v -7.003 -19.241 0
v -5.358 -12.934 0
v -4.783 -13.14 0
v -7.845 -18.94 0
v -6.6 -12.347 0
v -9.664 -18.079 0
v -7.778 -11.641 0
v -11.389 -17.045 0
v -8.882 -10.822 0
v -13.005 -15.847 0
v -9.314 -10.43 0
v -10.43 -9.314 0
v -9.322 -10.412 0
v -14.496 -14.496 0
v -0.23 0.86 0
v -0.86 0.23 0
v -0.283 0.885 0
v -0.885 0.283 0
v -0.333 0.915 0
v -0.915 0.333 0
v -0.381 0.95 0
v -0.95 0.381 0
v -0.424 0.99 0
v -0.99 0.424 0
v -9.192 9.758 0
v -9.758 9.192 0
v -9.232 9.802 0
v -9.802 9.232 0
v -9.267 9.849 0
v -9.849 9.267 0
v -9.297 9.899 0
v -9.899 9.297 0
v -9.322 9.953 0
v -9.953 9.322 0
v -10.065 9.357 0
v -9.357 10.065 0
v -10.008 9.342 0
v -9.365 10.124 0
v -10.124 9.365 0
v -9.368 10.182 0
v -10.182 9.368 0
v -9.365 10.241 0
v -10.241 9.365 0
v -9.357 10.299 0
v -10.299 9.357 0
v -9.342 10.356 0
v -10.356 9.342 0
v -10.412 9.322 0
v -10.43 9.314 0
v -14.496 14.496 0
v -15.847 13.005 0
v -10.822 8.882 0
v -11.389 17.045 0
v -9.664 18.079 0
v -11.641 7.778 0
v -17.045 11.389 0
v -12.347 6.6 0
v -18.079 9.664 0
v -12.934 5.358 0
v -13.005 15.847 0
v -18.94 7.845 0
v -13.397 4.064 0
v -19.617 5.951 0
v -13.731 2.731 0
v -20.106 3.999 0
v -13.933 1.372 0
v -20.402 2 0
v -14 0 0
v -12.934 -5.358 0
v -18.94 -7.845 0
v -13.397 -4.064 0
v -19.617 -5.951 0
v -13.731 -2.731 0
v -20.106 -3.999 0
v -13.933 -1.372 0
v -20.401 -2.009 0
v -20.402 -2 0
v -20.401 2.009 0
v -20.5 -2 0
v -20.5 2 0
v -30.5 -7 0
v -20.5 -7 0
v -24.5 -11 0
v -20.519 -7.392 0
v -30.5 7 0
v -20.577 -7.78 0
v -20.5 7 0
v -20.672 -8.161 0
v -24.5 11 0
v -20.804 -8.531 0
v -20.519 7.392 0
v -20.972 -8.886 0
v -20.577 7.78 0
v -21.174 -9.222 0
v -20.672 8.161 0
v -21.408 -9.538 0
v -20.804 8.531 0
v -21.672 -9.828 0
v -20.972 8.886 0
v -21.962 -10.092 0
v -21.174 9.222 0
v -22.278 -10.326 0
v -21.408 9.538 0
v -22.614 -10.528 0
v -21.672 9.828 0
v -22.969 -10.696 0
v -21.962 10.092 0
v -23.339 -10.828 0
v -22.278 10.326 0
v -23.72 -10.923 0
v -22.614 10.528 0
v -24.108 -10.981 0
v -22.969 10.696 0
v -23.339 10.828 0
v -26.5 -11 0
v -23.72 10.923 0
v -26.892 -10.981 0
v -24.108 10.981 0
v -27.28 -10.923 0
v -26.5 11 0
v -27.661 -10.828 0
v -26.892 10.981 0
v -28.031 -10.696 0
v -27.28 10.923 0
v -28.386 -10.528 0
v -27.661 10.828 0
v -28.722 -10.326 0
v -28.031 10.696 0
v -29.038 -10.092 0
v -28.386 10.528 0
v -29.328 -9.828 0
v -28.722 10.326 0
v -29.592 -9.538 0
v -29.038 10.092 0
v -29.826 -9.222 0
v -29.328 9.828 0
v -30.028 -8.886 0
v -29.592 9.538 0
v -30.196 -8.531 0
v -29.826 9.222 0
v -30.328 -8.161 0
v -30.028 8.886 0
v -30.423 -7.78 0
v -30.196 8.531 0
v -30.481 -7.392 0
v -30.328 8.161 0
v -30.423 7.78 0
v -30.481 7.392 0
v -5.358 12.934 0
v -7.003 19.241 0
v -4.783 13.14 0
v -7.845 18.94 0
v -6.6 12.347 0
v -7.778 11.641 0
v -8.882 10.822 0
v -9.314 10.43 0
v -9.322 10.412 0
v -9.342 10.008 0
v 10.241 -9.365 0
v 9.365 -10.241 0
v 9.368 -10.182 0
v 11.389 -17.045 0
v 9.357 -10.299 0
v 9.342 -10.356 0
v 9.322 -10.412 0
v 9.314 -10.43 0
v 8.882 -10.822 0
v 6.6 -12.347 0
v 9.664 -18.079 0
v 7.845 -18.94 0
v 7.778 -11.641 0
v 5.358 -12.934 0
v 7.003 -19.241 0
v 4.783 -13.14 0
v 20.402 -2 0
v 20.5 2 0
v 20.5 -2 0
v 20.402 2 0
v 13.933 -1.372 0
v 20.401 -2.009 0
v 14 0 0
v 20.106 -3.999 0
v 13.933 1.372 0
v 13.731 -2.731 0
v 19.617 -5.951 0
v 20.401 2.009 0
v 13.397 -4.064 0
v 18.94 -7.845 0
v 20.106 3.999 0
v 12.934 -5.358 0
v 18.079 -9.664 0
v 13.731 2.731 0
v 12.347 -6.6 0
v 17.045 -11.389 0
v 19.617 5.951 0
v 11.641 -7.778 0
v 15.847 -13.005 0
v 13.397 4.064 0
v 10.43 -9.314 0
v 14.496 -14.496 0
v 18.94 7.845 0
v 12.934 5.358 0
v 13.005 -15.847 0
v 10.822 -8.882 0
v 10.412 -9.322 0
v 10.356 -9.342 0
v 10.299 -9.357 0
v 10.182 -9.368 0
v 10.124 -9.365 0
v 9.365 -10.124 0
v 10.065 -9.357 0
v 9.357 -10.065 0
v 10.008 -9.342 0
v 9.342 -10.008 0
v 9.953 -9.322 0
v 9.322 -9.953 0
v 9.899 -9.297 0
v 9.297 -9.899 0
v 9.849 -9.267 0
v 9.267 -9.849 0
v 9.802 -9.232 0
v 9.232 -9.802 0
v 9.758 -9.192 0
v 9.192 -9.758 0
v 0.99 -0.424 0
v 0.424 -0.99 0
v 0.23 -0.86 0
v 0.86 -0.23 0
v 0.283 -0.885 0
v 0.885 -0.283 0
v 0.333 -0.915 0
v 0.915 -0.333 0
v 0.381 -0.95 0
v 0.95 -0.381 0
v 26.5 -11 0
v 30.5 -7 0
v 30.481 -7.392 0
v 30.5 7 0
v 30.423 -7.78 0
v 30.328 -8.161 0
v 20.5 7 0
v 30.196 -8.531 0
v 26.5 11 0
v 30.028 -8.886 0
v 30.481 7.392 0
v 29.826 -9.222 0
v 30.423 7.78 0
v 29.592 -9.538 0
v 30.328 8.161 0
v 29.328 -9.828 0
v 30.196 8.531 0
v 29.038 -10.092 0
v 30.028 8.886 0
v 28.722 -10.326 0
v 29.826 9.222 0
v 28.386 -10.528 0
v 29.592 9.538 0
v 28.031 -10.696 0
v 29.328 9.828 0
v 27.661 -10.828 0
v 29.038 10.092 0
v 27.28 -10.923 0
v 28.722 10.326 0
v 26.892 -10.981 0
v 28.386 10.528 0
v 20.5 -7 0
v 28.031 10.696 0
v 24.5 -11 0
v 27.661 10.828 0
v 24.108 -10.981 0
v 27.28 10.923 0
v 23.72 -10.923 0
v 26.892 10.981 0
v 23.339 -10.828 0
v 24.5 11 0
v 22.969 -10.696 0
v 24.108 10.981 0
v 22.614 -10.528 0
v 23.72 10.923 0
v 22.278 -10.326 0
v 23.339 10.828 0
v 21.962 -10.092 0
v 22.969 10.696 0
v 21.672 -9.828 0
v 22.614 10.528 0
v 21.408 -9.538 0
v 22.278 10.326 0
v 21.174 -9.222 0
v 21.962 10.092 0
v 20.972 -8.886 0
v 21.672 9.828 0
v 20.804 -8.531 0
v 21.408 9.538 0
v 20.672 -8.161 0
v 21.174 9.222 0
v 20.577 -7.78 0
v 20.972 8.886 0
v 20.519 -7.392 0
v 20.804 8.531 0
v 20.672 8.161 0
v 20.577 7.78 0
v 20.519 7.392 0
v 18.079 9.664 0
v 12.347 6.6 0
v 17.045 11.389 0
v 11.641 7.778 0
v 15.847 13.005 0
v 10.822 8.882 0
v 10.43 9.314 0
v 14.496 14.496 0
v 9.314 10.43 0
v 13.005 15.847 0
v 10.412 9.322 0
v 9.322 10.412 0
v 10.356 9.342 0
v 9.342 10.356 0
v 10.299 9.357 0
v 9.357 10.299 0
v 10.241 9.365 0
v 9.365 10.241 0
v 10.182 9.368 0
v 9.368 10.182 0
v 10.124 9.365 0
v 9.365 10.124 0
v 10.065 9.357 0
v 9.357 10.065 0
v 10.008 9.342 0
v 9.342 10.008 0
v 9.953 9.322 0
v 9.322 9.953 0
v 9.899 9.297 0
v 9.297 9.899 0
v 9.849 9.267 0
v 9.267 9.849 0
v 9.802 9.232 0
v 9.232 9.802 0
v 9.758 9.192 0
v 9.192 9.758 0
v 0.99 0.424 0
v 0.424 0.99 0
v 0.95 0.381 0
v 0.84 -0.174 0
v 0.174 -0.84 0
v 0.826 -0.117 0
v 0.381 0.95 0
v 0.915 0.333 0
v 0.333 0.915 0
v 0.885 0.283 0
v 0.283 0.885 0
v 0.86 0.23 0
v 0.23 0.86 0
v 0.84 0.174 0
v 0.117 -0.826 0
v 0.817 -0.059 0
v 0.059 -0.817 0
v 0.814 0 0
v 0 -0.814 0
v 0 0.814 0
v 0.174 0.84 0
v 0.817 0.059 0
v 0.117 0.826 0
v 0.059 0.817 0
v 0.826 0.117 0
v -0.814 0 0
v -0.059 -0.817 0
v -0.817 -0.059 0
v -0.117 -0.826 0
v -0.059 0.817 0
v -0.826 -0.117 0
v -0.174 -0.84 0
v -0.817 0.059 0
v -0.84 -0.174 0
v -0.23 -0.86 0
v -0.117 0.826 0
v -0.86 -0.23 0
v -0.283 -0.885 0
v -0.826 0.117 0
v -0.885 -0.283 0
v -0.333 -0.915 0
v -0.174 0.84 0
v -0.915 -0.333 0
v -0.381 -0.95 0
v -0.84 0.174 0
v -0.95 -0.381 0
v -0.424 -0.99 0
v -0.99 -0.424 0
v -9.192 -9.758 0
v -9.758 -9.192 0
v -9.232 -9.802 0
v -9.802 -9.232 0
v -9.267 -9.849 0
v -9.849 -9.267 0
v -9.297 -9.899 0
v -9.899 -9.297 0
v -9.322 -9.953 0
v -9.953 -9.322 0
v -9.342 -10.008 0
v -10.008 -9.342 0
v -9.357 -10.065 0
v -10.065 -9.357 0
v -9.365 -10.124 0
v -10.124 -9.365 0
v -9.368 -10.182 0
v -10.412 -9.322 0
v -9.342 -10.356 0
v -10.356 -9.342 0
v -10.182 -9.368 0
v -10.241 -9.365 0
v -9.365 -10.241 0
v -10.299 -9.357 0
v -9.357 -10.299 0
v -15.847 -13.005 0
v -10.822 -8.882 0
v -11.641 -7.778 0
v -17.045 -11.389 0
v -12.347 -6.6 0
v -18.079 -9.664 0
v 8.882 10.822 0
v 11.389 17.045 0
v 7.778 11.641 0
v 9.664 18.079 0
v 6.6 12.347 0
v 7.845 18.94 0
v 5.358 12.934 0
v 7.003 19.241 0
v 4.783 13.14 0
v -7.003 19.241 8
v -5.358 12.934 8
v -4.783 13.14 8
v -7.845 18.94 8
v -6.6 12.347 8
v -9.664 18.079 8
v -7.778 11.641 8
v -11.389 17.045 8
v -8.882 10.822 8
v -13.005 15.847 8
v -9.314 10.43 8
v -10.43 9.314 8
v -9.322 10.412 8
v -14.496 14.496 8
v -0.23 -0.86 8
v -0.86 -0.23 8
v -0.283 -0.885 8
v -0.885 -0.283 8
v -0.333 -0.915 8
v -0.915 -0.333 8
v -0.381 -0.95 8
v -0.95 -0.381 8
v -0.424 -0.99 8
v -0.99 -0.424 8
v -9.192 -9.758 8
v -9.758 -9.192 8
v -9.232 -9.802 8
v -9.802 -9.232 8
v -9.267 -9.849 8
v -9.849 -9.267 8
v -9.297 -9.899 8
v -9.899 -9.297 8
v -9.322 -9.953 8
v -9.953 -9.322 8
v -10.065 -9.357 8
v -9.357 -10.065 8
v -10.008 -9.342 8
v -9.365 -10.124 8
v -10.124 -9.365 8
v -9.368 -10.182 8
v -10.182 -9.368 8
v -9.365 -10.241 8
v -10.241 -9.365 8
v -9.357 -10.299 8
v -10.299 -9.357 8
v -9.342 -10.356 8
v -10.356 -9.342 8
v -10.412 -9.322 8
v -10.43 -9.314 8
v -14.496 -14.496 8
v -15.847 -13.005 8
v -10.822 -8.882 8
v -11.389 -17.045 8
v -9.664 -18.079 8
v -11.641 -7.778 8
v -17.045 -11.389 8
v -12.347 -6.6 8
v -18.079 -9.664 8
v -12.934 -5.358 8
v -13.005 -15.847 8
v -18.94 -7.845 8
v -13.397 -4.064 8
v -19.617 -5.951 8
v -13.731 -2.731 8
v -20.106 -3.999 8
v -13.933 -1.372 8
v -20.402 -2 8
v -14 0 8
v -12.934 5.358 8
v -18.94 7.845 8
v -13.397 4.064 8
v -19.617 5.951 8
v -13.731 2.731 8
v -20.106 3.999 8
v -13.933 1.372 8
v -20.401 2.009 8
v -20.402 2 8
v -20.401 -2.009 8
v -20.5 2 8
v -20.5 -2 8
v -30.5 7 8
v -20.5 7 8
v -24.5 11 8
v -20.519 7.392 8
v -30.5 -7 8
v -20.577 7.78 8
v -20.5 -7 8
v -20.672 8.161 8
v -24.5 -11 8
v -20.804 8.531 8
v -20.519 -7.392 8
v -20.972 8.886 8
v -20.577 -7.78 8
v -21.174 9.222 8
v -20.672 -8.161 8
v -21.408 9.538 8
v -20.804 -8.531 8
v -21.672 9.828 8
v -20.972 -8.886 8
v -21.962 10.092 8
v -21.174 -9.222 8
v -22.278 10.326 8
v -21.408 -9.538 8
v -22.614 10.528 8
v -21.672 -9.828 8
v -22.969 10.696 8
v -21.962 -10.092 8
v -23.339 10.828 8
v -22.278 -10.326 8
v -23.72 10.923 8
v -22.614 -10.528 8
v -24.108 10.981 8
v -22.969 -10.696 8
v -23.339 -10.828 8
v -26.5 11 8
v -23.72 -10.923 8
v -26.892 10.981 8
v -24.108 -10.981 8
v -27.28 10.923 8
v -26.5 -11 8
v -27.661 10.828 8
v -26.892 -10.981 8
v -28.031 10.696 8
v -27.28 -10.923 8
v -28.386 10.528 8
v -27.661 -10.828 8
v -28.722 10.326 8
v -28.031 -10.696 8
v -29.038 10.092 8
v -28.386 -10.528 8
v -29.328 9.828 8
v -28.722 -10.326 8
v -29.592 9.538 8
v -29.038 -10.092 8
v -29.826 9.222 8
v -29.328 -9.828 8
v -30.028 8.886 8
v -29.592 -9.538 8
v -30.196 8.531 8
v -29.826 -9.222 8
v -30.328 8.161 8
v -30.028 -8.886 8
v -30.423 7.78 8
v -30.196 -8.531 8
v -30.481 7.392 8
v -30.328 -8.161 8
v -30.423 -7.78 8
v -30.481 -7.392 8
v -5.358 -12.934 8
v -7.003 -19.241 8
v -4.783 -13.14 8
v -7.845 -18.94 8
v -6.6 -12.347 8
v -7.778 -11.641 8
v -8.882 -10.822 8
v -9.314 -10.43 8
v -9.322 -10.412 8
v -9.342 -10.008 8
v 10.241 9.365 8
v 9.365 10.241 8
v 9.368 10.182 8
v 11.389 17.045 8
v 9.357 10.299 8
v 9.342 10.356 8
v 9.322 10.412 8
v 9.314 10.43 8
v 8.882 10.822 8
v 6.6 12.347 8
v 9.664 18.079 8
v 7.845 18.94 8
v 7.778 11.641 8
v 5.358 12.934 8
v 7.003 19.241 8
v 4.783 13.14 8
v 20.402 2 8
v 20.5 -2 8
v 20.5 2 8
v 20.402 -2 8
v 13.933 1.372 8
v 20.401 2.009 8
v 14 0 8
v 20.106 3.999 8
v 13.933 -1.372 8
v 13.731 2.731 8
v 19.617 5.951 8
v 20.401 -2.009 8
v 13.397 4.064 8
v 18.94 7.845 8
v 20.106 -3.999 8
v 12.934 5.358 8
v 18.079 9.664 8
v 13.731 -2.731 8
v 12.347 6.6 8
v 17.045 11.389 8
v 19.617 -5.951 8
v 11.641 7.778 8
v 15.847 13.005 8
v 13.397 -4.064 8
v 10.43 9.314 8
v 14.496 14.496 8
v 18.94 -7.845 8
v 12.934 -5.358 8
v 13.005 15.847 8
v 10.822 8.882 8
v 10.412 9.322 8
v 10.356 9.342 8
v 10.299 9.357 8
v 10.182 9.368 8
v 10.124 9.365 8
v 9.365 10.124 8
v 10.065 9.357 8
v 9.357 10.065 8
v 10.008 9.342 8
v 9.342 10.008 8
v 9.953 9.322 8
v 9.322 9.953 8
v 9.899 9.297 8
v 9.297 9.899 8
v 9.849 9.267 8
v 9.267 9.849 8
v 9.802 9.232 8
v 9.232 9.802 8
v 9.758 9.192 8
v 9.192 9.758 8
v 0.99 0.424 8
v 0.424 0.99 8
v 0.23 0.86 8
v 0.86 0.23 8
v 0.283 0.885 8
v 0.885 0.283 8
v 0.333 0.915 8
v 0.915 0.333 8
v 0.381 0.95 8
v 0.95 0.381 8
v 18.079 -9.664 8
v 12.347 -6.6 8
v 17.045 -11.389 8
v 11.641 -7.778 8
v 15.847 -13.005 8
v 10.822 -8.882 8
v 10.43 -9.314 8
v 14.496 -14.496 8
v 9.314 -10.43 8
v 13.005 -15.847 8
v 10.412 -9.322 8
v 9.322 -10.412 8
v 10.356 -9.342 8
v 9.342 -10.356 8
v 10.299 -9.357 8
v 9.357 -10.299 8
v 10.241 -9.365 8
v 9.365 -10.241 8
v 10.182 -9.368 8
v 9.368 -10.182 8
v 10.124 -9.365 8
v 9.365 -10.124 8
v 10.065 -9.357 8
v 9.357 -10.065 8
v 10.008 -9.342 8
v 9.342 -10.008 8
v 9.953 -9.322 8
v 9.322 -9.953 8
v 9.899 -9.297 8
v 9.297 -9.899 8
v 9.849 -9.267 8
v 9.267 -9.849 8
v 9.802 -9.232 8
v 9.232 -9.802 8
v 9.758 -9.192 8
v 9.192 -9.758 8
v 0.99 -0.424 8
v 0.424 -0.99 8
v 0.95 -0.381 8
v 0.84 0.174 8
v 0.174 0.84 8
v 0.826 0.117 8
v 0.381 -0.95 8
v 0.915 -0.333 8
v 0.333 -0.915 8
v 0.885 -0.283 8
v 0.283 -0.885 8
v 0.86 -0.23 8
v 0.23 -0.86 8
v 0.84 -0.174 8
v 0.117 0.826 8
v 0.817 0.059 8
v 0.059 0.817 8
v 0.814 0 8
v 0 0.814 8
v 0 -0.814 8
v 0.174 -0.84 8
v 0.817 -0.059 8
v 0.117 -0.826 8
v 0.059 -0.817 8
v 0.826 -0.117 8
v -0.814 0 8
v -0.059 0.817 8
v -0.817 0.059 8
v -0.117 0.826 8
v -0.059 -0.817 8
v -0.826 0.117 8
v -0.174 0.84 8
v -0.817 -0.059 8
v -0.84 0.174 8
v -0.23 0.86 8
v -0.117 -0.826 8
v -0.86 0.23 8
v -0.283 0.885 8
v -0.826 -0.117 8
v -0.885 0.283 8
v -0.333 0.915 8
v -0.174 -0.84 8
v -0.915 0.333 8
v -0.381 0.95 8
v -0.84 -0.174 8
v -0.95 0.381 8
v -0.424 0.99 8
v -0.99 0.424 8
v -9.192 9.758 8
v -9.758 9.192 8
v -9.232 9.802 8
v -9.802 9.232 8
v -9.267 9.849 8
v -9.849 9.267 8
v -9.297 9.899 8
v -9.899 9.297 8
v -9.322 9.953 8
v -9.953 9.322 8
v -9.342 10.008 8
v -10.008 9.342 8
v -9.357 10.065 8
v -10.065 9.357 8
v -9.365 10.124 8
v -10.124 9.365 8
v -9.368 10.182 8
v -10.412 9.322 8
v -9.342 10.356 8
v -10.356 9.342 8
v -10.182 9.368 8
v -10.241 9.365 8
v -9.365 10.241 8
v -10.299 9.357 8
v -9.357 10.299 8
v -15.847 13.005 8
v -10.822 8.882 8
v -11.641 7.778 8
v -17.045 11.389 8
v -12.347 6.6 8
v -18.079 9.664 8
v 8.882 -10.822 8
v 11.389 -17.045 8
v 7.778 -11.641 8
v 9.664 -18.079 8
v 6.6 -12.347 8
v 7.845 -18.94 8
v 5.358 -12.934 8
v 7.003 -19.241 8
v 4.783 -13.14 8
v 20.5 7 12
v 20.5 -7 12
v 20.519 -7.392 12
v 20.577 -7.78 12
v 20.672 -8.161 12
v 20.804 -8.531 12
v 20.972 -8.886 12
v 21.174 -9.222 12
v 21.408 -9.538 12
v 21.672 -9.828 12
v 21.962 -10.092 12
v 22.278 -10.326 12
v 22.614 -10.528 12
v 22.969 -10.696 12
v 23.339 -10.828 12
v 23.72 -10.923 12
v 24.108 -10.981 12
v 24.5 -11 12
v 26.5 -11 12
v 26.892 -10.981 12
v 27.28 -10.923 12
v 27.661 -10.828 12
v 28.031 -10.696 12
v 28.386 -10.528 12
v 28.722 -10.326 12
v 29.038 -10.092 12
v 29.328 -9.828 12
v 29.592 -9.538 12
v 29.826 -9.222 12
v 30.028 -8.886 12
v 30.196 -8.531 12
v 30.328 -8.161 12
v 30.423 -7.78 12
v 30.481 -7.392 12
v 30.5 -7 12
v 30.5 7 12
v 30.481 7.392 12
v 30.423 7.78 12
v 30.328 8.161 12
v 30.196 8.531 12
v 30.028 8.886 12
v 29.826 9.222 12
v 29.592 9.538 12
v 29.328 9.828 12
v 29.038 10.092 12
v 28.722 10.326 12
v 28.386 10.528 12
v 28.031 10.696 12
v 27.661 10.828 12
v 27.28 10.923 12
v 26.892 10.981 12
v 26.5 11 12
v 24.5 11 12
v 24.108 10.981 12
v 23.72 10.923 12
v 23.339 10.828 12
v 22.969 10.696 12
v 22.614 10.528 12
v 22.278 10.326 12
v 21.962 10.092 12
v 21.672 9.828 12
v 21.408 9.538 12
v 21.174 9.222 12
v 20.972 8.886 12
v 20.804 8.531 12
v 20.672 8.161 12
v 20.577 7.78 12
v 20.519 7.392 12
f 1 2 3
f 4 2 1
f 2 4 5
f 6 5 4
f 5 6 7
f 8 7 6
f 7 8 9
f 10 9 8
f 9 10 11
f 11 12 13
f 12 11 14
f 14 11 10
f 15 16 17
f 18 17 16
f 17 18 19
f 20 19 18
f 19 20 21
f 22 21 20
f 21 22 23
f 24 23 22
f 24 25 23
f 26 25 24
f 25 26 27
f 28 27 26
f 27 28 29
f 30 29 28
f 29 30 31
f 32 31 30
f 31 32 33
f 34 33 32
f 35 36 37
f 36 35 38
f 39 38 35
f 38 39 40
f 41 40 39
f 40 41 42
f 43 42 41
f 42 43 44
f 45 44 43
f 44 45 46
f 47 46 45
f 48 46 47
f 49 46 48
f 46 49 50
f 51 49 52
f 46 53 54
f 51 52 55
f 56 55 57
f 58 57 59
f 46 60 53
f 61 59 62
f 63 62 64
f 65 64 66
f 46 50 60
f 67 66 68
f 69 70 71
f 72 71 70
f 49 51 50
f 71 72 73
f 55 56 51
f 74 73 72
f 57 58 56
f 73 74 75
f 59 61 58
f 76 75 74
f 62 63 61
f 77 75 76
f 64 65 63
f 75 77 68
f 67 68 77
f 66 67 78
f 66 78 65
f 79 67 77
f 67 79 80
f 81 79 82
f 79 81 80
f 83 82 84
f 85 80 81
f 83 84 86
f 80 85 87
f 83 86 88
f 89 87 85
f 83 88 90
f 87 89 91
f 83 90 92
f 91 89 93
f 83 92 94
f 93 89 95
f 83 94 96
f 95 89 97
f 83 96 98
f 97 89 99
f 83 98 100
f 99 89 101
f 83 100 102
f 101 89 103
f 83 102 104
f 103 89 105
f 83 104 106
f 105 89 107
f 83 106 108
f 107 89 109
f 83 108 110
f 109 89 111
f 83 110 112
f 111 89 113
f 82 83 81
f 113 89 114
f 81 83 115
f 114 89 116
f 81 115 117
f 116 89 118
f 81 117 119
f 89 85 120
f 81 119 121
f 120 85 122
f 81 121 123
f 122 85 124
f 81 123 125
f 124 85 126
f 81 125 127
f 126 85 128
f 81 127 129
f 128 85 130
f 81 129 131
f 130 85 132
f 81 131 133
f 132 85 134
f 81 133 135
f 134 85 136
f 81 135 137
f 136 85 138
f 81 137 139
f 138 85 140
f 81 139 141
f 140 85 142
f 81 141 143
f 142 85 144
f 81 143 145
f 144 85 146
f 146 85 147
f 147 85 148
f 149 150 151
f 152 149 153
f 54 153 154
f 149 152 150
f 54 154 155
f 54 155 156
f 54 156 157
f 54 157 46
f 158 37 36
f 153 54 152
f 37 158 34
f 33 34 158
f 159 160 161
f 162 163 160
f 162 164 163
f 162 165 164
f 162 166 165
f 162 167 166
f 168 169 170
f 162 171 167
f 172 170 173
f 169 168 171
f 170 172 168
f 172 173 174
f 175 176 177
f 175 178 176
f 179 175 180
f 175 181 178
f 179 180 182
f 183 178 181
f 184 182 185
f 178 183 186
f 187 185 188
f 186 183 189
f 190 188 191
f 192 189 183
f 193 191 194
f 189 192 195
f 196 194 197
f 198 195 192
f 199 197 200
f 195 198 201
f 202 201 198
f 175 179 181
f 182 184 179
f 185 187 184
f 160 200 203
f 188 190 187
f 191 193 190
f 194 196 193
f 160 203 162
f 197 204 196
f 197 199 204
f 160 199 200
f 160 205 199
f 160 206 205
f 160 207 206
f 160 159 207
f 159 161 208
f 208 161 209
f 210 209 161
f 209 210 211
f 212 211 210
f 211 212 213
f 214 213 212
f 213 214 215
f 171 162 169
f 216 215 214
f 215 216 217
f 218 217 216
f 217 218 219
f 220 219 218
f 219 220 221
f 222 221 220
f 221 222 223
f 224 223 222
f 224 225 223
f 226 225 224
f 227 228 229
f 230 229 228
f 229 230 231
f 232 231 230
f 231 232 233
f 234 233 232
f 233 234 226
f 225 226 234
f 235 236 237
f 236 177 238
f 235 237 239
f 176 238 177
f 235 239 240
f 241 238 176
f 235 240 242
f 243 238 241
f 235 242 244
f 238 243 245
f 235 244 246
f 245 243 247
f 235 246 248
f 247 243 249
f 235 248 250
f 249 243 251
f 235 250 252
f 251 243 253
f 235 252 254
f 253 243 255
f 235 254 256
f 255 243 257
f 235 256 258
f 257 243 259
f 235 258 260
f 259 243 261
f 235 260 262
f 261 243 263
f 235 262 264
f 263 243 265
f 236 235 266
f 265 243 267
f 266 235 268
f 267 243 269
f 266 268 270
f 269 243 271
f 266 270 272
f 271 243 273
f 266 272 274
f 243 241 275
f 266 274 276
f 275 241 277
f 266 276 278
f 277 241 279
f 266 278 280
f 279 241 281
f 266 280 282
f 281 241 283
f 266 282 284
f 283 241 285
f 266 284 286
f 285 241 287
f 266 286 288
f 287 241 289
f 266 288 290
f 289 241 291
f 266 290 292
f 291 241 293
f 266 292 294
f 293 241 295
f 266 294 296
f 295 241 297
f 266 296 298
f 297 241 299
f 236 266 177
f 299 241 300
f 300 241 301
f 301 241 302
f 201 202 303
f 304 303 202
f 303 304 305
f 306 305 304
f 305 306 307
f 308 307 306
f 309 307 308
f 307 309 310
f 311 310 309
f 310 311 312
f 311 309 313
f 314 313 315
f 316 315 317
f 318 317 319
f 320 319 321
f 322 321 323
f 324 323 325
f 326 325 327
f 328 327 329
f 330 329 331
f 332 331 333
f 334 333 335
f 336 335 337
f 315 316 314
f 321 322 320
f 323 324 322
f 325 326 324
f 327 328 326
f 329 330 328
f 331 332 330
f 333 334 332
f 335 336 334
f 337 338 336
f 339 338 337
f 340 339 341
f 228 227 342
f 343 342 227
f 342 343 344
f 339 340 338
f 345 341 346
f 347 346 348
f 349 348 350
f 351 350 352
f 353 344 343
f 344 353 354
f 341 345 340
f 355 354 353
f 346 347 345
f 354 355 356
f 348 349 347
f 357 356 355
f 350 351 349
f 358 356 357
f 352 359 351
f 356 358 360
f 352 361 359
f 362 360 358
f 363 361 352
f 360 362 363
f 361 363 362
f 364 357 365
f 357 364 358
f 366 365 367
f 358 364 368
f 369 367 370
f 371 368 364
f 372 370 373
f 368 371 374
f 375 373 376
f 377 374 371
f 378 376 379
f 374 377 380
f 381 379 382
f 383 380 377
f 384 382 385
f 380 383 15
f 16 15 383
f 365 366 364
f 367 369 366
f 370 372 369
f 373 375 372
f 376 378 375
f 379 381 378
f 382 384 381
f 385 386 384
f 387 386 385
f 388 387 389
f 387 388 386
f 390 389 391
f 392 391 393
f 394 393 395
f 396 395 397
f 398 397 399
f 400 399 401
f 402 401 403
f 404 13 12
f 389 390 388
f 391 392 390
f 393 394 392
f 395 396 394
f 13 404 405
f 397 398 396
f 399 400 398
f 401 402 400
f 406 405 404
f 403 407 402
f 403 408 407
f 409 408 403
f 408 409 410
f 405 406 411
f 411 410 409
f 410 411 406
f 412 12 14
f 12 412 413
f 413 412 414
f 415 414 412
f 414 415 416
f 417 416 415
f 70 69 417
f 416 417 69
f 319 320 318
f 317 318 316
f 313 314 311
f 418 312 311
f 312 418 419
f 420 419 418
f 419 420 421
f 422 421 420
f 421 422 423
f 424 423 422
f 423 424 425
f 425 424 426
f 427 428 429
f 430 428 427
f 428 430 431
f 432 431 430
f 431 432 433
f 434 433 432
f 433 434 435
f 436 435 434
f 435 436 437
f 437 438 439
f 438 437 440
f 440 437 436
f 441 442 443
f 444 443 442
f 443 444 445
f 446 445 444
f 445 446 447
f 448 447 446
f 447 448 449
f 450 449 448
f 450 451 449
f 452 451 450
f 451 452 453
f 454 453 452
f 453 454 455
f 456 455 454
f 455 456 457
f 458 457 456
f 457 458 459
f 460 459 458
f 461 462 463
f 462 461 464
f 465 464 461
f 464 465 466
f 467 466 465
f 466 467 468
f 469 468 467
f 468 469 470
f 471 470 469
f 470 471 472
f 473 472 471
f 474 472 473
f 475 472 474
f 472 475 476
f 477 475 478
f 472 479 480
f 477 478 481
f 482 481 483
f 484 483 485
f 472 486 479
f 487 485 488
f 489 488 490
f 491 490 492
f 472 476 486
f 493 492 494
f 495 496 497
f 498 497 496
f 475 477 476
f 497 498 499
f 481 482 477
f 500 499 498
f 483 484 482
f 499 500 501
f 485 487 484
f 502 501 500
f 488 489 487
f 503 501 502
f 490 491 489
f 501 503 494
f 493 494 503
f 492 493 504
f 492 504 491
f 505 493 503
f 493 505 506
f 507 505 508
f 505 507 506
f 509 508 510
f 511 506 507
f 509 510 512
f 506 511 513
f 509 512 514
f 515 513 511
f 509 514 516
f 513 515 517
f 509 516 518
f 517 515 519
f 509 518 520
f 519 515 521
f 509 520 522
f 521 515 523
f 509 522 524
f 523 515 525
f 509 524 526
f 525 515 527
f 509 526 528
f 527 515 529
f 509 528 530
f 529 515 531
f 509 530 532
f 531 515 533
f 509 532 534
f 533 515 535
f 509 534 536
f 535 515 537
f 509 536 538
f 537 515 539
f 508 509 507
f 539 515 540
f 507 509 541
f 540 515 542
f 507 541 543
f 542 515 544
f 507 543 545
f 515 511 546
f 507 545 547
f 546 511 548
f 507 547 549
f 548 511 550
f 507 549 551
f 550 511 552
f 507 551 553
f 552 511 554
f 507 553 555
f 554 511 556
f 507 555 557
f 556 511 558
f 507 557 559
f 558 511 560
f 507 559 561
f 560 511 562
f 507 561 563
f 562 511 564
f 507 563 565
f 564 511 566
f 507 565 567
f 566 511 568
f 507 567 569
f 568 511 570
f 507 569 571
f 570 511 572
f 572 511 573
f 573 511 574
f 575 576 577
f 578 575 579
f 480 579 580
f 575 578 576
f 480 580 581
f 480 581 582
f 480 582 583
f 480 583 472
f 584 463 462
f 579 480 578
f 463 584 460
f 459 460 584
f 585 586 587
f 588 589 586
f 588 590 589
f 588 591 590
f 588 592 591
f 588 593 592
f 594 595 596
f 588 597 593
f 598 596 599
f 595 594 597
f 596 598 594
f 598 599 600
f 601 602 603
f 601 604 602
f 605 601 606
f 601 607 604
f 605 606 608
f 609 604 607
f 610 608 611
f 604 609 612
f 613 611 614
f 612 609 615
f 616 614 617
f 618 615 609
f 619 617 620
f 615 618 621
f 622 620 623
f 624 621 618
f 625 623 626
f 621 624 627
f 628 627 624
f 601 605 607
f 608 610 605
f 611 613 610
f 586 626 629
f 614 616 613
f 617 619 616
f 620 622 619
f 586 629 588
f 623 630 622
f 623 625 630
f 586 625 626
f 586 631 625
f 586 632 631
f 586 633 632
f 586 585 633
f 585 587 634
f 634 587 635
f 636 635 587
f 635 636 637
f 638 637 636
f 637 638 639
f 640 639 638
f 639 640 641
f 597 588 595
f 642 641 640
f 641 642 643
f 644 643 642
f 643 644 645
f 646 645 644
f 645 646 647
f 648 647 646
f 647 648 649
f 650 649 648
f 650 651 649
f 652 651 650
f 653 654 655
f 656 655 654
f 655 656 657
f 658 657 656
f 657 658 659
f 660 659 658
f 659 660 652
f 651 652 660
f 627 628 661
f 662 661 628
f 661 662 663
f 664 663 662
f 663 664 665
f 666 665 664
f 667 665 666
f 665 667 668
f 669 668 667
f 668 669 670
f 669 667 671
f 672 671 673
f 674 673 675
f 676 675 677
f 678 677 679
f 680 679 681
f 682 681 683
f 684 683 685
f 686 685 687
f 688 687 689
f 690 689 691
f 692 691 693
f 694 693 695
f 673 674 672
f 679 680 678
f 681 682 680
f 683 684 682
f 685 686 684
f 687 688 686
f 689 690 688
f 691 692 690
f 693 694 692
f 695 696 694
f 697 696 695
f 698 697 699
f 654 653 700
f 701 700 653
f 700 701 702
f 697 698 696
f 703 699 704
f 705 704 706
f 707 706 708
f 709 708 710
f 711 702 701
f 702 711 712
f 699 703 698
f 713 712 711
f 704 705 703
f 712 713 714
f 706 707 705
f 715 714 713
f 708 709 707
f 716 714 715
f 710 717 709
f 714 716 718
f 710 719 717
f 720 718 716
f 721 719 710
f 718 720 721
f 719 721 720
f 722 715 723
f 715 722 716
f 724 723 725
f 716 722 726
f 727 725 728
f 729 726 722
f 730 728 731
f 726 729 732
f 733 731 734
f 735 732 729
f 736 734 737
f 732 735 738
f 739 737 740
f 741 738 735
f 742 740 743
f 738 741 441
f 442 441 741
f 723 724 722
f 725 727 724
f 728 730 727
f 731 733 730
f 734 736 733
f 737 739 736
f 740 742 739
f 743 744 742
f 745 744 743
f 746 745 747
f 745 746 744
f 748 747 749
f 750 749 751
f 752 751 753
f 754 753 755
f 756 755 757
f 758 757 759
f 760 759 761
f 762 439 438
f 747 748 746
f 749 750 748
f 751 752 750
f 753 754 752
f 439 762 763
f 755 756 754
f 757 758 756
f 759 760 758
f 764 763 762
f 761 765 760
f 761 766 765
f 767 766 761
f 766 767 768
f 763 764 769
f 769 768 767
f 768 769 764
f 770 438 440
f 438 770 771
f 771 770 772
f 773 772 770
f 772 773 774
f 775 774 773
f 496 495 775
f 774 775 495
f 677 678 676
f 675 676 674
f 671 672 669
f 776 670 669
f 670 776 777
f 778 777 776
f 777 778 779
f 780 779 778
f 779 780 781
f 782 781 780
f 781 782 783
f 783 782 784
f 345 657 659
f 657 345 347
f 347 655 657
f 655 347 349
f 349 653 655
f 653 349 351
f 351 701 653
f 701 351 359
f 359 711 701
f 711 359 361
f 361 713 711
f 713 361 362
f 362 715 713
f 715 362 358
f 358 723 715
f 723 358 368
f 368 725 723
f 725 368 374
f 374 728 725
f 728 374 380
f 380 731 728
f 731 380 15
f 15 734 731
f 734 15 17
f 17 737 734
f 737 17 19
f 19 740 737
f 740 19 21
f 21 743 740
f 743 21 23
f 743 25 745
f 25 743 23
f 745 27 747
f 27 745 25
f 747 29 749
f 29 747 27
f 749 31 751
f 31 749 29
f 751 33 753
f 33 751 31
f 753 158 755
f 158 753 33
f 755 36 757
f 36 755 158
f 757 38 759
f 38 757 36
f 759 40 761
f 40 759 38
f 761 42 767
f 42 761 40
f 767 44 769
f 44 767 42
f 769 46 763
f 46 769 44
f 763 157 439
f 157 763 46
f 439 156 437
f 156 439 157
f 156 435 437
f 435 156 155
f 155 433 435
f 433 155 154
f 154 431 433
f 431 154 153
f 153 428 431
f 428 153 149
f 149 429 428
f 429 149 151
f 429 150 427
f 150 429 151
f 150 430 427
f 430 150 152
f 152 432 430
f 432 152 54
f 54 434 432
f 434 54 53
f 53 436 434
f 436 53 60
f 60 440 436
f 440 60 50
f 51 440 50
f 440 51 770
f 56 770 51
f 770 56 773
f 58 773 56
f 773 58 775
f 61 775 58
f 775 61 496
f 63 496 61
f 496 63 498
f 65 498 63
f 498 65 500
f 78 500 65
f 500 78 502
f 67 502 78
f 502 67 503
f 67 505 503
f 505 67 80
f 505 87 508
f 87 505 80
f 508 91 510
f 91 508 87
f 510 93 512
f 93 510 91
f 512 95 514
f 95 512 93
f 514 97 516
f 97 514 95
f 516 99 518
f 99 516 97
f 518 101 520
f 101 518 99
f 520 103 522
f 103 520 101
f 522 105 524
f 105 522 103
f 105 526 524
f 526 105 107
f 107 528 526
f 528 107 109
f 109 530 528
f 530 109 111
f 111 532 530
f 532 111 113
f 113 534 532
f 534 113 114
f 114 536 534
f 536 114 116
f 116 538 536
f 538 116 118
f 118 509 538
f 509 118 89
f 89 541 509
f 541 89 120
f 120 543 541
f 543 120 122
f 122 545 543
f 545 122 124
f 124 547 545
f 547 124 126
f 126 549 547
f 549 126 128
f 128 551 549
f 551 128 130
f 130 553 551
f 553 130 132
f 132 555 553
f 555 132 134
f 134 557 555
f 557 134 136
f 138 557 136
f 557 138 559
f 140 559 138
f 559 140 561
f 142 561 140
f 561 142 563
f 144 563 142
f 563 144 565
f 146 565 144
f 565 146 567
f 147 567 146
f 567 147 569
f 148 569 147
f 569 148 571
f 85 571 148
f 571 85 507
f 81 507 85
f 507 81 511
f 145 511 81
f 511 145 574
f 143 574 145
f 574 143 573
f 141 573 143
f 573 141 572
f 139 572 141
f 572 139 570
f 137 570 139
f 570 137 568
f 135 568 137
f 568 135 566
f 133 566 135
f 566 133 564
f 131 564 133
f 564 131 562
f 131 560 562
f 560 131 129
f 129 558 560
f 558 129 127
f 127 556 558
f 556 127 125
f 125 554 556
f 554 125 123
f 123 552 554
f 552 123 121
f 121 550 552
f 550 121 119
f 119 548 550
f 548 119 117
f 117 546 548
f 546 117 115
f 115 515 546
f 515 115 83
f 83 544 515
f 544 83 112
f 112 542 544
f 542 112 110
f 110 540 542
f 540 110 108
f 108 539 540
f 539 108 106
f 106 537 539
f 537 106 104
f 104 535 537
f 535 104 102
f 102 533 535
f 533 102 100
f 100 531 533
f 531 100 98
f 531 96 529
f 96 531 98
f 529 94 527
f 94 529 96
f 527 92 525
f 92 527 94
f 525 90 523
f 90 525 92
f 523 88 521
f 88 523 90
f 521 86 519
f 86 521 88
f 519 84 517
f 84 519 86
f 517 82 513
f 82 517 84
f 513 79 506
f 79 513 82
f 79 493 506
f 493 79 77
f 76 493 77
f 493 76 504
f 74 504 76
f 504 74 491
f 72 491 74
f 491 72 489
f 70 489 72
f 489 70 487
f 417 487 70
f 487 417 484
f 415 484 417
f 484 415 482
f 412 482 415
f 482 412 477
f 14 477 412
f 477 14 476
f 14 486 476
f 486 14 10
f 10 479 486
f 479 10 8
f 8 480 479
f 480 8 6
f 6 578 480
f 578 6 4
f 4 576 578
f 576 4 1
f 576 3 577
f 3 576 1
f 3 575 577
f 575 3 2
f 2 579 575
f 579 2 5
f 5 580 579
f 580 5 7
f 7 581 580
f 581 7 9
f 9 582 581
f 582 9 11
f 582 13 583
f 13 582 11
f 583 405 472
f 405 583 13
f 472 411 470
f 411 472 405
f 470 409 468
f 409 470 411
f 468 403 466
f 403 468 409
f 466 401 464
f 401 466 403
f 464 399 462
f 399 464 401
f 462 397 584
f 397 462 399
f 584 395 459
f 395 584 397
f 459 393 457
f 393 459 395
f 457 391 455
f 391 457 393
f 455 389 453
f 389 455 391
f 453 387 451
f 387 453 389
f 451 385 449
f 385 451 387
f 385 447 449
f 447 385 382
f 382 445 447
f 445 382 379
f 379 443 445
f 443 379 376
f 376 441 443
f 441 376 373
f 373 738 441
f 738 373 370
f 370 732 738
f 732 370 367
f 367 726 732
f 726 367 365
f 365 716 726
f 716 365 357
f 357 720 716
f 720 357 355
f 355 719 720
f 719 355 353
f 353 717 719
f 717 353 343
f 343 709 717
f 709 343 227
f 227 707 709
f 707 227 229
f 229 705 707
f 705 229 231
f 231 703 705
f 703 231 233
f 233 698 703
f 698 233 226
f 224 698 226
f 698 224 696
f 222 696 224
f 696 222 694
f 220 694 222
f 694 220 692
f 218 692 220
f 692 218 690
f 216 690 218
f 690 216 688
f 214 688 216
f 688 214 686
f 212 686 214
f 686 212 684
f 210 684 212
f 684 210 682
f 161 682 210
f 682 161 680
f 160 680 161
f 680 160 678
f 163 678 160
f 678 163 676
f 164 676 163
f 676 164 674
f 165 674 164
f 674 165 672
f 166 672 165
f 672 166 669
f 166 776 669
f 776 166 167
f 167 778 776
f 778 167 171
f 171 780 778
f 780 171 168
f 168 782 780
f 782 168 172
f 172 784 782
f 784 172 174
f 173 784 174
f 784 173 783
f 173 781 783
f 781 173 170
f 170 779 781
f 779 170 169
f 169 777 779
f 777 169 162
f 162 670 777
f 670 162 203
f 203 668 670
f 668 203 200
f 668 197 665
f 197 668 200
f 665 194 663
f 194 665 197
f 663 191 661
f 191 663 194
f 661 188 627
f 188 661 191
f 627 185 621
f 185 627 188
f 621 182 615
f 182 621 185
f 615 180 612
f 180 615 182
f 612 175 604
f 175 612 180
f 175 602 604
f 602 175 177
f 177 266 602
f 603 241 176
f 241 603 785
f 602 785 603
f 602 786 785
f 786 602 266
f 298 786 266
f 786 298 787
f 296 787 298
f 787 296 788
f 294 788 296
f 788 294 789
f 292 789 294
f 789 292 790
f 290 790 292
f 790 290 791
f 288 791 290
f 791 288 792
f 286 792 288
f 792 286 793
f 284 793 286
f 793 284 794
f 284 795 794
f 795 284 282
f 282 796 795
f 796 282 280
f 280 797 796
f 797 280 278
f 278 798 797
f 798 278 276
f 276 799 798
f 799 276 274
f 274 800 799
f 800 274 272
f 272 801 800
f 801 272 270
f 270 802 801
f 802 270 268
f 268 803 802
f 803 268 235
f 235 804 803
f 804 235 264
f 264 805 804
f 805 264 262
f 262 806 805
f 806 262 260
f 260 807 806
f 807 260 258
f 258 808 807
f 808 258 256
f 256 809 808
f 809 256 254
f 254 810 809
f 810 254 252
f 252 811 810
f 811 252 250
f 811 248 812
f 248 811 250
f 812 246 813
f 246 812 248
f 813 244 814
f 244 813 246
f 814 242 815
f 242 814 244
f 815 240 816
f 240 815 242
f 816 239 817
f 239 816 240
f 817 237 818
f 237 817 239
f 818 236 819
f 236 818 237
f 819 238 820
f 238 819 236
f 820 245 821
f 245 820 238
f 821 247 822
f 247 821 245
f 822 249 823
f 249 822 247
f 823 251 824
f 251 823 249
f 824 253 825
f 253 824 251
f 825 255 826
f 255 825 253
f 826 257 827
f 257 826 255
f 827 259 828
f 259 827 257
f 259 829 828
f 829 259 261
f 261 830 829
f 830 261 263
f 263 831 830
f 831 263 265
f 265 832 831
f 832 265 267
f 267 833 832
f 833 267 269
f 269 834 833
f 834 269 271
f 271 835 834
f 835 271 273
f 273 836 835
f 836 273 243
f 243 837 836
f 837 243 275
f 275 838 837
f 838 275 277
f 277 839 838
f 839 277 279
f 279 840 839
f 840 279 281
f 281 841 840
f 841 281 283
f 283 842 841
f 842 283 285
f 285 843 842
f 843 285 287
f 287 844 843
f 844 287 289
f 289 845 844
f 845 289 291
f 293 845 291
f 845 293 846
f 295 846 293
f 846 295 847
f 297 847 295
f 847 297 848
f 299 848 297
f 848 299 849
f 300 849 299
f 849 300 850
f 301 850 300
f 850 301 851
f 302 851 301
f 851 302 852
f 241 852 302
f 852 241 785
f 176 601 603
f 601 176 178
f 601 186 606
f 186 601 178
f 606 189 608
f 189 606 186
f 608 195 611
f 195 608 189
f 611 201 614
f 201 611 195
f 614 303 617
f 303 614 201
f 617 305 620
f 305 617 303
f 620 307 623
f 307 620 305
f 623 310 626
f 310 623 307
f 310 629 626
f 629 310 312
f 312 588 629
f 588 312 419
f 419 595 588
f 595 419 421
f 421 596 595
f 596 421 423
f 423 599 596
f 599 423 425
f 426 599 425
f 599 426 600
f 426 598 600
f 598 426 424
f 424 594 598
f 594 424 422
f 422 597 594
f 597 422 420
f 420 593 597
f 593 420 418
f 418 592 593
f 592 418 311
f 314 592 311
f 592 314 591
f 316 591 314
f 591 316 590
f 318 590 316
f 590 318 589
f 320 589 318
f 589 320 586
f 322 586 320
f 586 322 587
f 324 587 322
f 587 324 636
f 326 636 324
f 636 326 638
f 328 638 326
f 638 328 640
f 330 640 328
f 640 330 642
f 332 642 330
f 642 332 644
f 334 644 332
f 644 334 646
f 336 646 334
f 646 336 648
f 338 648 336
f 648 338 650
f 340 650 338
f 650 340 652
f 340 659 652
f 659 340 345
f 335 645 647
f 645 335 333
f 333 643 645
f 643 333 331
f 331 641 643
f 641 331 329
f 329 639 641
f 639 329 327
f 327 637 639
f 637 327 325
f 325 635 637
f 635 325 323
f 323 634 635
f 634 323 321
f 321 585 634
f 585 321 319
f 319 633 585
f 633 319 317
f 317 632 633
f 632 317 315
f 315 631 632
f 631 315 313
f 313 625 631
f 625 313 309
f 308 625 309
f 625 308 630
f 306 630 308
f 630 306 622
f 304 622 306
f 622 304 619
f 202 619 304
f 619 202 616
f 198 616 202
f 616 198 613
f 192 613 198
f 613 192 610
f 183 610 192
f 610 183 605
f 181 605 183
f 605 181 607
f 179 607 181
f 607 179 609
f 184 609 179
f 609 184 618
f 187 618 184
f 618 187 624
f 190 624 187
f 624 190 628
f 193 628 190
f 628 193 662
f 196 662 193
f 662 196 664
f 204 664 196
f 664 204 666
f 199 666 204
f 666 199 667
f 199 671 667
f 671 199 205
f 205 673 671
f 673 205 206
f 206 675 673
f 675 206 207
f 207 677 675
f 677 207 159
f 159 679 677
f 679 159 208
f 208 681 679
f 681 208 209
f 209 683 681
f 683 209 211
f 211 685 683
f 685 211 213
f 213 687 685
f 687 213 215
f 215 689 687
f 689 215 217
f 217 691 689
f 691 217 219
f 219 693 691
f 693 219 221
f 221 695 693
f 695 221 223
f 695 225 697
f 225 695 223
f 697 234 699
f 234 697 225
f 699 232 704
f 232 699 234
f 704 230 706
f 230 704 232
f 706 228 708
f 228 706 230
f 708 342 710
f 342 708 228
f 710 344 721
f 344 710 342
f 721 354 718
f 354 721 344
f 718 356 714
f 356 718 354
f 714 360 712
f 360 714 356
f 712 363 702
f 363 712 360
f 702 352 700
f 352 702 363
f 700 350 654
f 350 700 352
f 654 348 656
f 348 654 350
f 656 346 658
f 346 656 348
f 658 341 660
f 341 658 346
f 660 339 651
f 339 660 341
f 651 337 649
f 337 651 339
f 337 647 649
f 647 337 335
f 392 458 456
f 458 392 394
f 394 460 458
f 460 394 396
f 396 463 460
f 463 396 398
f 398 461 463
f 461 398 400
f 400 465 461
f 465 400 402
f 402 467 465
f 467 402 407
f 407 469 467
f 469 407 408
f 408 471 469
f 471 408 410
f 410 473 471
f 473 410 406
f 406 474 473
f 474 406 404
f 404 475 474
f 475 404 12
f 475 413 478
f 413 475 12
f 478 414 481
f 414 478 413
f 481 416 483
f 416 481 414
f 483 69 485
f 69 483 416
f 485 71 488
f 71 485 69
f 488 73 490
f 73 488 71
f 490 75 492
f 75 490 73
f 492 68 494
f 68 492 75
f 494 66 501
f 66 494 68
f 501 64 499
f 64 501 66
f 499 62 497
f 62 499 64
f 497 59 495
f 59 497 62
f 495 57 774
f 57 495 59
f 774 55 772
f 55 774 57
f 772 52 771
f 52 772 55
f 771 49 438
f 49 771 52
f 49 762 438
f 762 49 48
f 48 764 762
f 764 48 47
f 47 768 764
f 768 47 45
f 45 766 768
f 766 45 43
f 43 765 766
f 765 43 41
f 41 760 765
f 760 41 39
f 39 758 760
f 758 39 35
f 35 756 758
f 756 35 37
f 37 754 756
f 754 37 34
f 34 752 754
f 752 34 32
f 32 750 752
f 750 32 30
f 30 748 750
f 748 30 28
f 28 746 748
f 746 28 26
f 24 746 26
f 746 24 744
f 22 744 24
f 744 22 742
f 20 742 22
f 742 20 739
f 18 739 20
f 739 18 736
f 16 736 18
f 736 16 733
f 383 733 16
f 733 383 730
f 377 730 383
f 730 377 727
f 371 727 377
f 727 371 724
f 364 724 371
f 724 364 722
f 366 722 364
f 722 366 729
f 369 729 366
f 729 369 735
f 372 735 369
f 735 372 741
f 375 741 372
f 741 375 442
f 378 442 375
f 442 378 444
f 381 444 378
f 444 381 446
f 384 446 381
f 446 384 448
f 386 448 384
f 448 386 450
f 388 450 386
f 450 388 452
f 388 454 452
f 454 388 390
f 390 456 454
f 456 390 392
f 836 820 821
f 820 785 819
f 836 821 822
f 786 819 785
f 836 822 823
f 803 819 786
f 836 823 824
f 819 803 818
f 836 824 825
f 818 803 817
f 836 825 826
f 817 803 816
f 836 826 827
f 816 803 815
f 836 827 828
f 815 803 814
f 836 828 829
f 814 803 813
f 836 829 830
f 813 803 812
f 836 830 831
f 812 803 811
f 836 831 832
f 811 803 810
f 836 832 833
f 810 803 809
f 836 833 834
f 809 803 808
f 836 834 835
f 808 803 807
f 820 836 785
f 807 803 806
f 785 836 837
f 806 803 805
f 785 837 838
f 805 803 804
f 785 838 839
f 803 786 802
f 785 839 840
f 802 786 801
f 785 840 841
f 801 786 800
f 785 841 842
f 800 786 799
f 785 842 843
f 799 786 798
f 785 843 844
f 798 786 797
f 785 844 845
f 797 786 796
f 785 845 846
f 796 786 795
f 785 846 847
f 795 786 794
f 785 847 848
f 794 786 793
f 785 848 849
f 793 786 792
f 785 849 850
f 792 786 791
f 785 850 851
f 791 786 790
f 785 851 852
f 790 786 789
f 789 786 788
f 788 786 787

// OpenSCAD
// cross-axis-flexure-pivot — a desk-scale compliant hinge: two slender beams
// cross at mid-span and weld at the crossing, so the stage rotates about a
// NEAR-FIXED VIRTUAL CENTER — the pinless hinge that, unlike a single
// small-length flexural pivot, does not wander under light load. Tier-2
// technique reference for docs/advanced-techniques.md Domain 1 (flexure
// joint families): the catalog had the SLFP (snap-cantilever-clip), the LET
// panel and the bistable arch, but not the cross-axis row — "good in
// tension, WEAK IN COMPRESSION, near-fixed virtual center".
//
// Dimensioned from the WELDED geometry, not the unwelded leaf ideal:
//
//   I = w*t^3 / 12              second moment of area (mm^4)
//   K = 8*E*I / L               pivot stiffness (N*mm/rad): the weld pins the
//                               crossing (no lateral drift), so each strip is
//                               two half-beams of length L/2 in an S-bend,
//                               four half-beams in parallel → 8·EI/L
//   sigma_weld = 2*E*t*θ/L      peak bending stress at the weld under that
//                               pinned S-bend (M_weld = 4·EI·θ/L); the pure-
//                               moment leaf σ = E·t·θ/(2L) is ~4× lower and
//                               describes beams that cross WITHOUT touching
//
// and CC1 (orientation), the reason this prints flat: the whole silhouette
// lives in the XY (bed) plane and is extruded up in Z to `w`, so every beam
// bends IN the layer plane — bending stress runs across the roads inside a
// layer, never across the bond between layers. Upright beams are out of
// scope (brief: "orientation is the product").
//
// Mechanism: a rigid frame arc and a rigid stage arc share one center (the
// virtual center at the origin, left open — neither body covers it). Two
// beams at ±alpha span the `L` between the arcs' inner faces, weld to each
// where they cross, and root into the arcs. The arcs' end faces are the hard
// stops: the stage arc's face meets the frame arc's face exactly at
// ±stop_angle, face to face over the full ring wall, so the brief's
// "overload in compression" demo bends the beams, not the stops. Requirements,
// derivations and the tune order: NOTES.md. All dimensions in millimeters.

/* [Flexure - the crossed beams] */
// Beam thickness t (mm) — the highest-leverage knob: stiffness ~ t^3, root
// stress ~ t. Production floor 0.8 (2 extrusion widths); the coupon strip
// deliberately sweeps below it to show why.
t = 0.8;
// Beam free span L (mm) — root-to-root along each strip, between the arcs'
// inner faces. Longer = lower stress for the same angle (strain ~ 1/L).
L = 28;
// Beam width = part height (mm). Multi-perimeter so one bad road does not
// kill the beam; root stress does not depend on it.
w = 8;
// Root fillet (mm) — doc fatigue rule r >= 0.5*t. Applied at the eight ring
// roots AND the four re-entrant weld corners (the highest-moment real estate).
root_fillet = 0.6;
// Crossing half-angle (deg) — each strip is inclined ±alpha to the frame↔
// stage axis and the two weld where they cross. 45 is the classic symmetric
// cross; it puts all four roots at the same radius.
alpha = 45;
// Assumed Young's modulus (MPa) — design datum for the echoes below, a
// literature-ish PETG default, NOT a measured filament. The coupon is the
// truth (NOTES.md, "Print this first").
E = 2000;

/* [Frame, stage & hard stops] */
// Hard-stop angle (deg) — the stage arc's end face meets the frame arc's end
// face exactly here, both sides. The brief's ROM target; raise toward 60 only
// if a PETG coupon survives (root stress scales linearly).
stop_angle = 40;
// Ring wall (mm) — radial thickness of the frame/stage arcs. Rigid by
// design: all compliance belongs in the beams.
arc_wall = 6.5;
// Finger tab length × width (mm) and corner radius — the handle you twist,
// and its mirror on the frame (the part you hold).
tab_len = 10;
tab_w = 22;
tab_r = 4;
// Raised finger-pad height (mm) on the stage tab — marks the side that
// moves and lifts the fingertip clear of the bed. 0 disables.
h_pad = 4;

/* [Quality] */
// Production tessellation for the arcs and fillet arcs. Previews and the
// gated STL both use this value (no per-export override).
$fn = 64;

// ---- derived -----------------------------------------------------------
r_in     = L / 2;                    // arcs' inner faces = the free-span ends
r_out    = r_in + arc_wall;          // arcs' outer radius
arc_half = (180 - stop_angle) / 2;   // each arc's half-width: face-to-face
                                     // contact lands exactly at stop_angle
land     = arc_wall - 0.5;           // beam root buried inside the ring band
tab_cx   = r_out + tab_len / 2;      // finger-tab center radius (25.5 stock)
theta    = stop_angle * PI / 180;    // ROM in rad
I        = w * t * t * t / 12;       // second moment of area (mm^4)
// Welded (pinned-crossing) model — see header. The leaf formulas below are
// kept as the unwelded reference so a reader can see the ~4× gap.
K          = 8 * E * I / L;            // pivot stiffness (N*mm/rad)
sigma_weld = 2 * E * t * theta / L;    // peak at weld, pinned S-bend
sigma_leaf = E * t * theta / (2 * L);  // pure-moment leaf (unwelded ideal)
F_handle   = K * theta / tab_cx;       // fingertip force at the tab (N)

// fitcheck pocket probes: the four open pockets flanking the crossing, on
// the ±x/±y bisectors. A probe is valid while it stays clear of both beams.
probe_d  = 0.6 * r_in;
probe_r  = 1.5;
probe_pts = [[probe_d, 0], [0, probe_d], [-probe_d, 0], [0, -probe_d]];

echo(str("cross-pivot: K ~= ", K, " N*mm/rad at +/-", stop_angle,
         " deg  (welded / pinned-crossing: 8*E*I/L, I = ", I, " mm^4, E = ",
         E, " MPa assumed)"));
echo(str("weld stress at +/-", stop_angle, " deg: ", sigma_weld,
         " MPa (pinned S-bend) — leaf ideal would be ", sigma_leaf,
         " MPa; cycle the pivot itself for the weld, not only the coupon"));
echo(str("fingertip force at r = ", tab_cx, " mm: ", F_handle,
         " N — firm at desk scale under the welded model"));
if (t < 0.8)
    echo(str("WARNING: t = ", t, " is under the 0.8 mm production floor ",
             "(2 extrusion widths) — fine for a deliberate coupon row, ",
             "not for the pivot"));

module checks() {
    assert(t >= 0.5, "t under 0.5 mm will not extrude at all");
    assert(root_fillet >= 0.5 * t,
           "root fillet below 0.5*t — ring roots and weld corners are crack starters");
    assert(w >= 2.4, "beam width under 3 perimeters (2.4 mm) — one bad road kills the beam");
    assert(alpha > 10 && alpha < 80, "crossing half-angle outside 10-80 deg");
    assert(stop_angle > 5 && stop_angle < 80, "hard-stop angle outside 5-80 deg");
    assert(arc_wall >= 1.6, "ring wall under 1.6 mm — the arcs must be rigid, not a second flexure");
    // the arcs must cover both beam roots with land to spare
    assert(arc_half >= alpha + 6,
           "arc half-width does not cover the beam roots — lower stop_angle or alpha");
    // the buried beam end must stay inside the ring's outer face
    assert(pow(r_in + land, 2) + pow(t / 2, 2) < pow(r_out - 0.2, 2),
           "beam end pokes through the ring's outer face");
    // fitcheck probes must sit in open pocket, clear of both beams AND of
    // the weld-corner fillets that grow outward along the same bisectors
    assert(probe_d * sin(alpha) - t / 2 >= probe_r + 0.5,
           "pocket probes no longer clear the beams — move them or shrink probe_r");
    assert(probe_d - (t / 2) / sin(alpha) - max(root_fillet, 0.5 * t) >= probe_r + 0.5,
           "±x pocket probes collide with weld fillets — move them or shrink fillet/probe");
    assert(probe_d - (t / 2) / cos(alpha) - max(root_fillet, 0.5 * t) >= probe_r + 0.5,
           "±y pocket probes collide with weld fillets — move them or shrink fillet/probe");
    // coupon guards
    assert(min(coupon_ts) >= 0.5, "coupon rows under 0.5 mm will not extrude");
    assert(max(coupon_ts) <= 1.6, "coupon rows over 1.6 mm stop being a flexure ladder");
}

// ---- 2D primitives (the whole part is one bed-plane silhouette) --------
module rounded2d(len, wid, r)   // convex-corner-rounded rectangle
    offset(r = r) offset(delta = -r) square([len, wid], center = true);

// annular band r_in..r_out over [-arc_half, +arc_half]. The wedge that cuts
// the band is a quad with a mid-radius point so its chord edges stay outside
// r_out at every arc_half this file allows.
module ring_arc_2d() {
    rb = r_out + 10;
    intersection() {
        difference() { circle(r_out); circle(r_in); }
        polygon([[0, 0],
                 [rb * cos(-arc_half), rb * sin(-arc_half)],
                 [rb, 0],
                 [rb * cos(arc_half), rb * sin(arc_half)]]);
    }
}

// the two strips, welded where they cross at the virtual center
module beams_2d()
    for (a = [alpha, -alpha])
        rotate([0, 0, a]) square([2 * (r_in + land), t], center = true);

// canonical root fillet: concave corner at the origin, rigid material at
// x >= 0 (the ring face), beam material at y <= 0 (the flank). The piece
// lives in x [-f,0] x y [0,f] outside the quarter-disc — the same
// corner-piece-outside-the-disc construction snap-cantilever-clip uses
// (the disc-intersection variant touches at tangent points and never welds).
module root_fillet_2d(f)
    difference() {
        translate([-f, 0]) square([f, f]);
        translate([-f, f]) circle(f);
    }

// four corners of one strip: e picks the end, s the flank; the flips must
// COMPOSE (nested single-axis mirrors) — a combined mirror([1,1]) is a
// reflection about y = -x, which the canonical piece is symmetric under, so
// the double-flip corner silently got no fillet at all (measured off the
// export: 6/8 corners carried the r=0.6 arc, this one carried none). a is
// the strip's inclination (0 for the coupon's straight specimens).
module root_fillets_at_2d(span, tt, a)
    for (e = [1, -1], s = [1, -1])
        rotate([0, 0, a])
            translate([e * span, s * tt / 2])
                mirror([e < 0 ? 1 : 0, 0])
                    mirror([0, s < 0 ? 1 : 0])
                        root_fillet_2d(max(root_fillet, 0.5 * tt));

// all eight on the pivot: 2 strips x 2 ends x 2 flanks
module root_fillets_2d(span, tt)
    for (a = [alpha, -alpha]) root_fillets_at_2d(span, tt, a);

// One fillet filling a concave notch of air-angle `psi` (deg). Local frame:
// corner at the origin, notch bisector along +x, walls at ±psi/2 from +x.
// Same square-minus-disc discipline as root_fillet_2d (shares a full edge
// with each wall) — generalized past the 90° case so the acute and obtuse
// weld notches (psi = 2*alpha and 180-2*alpha) both get r ≥ 0.5·t.
module notch_fillet_2d(f, psi) {
    hw = psi / 2;
    d  = f / sin(hw);       // corner → arc center along the bisector
    tl = f / tan(hw);       // corner → tangent point along each wall
    // CCW winding (OpenSCAD drops a clockwise polygon as empty area).
    difference() {
        polygon([[0, 0],
                 [tl * cos(hw), -tl * sin(hw)],
                 [tl * cos(hw),  tl * sin(hw)]]);
        translate([d, 0]) circle(f);
    }
}

// Four re-entrant corners of the welded X. Corners sit on the angle
// bisectors (±x / ±y) at the beam half-width measured along that axis:
// x-bisector notches at (t/2)/sin(alpha), y-bisector at (t/2)/cos(alpha)
// (equal at alpha = 45). Air angles 2*alpha and 180-2*alpha respectively.
module weld_fillets_2d() {
    f = max(root_fillet, 0.5 * t);
    r_x = (t / 2) / sin(alpha);
    r_y = (t / 2) / cos(alpha);
    for (a = [0, 180])
        rotate([0, 0, a])
            translate([r_x, 0])
                notch_fillet_2d(f, 2 * alpha);
    for (a = [90, 270])
        rotate([0, 0, a])
            translate([r_y, 0])
                notch_fillet_2d(f, 180 - 2 * alpha);
}

// spine/arm: a capsule from inside the ring band out under the tab. Both
// circles stay inside the band radially (no lobe past the ring's outer
// face) and the far end stays inside the tab (no nub past its edge).
module arm_2d()
    hull() {
        translate([r_in + 3, 0]) circle(2);
        translate([tab_cx - 4, 0]) circle(2);
    }

module frame_2d()
    union() {
        rotate([0, 0, 180]) ring_arc_2d();
        mirror([1, 0]) arm_2d();                  // spine out to the grip tab
        translate([-tab_cx, 0]) rounded2d(tab_len, tab_w, tab_r);
    }

module stage_tab_2d()
    translate([tab_cx, 0]) rounded2d(tab_len, tab_w, tab_r);

module stage_2d()
    union() {
        ring_arc_2d();
        arm_2d();                                 // handle arm out to the tab
        stage_tab_2d();
    }

module pivot_2d()
    union() {
        frame_2d();
        beams_2d();
        root_fillets_2d(r_in, t);
        weld_fillets_2d();
        stage_2d();
    }

// ---- the coupon: flexure fatigue ladder --------------------------------
// Print this first (NOTES.md has the protocol): a strip of single-beam
// specimens straight from the production dimensions — the t ladder
// (coupon_ts) plus two IDENTICAL production-t twins, one to print in PETG
// and one in PLA, so the material ranking is measured, not assumed.
// SCOPE: the coupon qualifies a STRAIGHT beam (t ladder + material twin).
// It has no crossing and no weld — the pivot's highest-stress junction is
// absent. Cycle the production pivot itself for the welded X; use the
// coupon to pick t and filament before that print.
coupon_ts = [0.6, 0.8, 1.0];
// pitch >= specimen length (L + 2*tab_len) + clearance, or adjacent grips
// fuse and the ladder prints as one untestable lump
coupon_pitch_x = L + 2 * tab_len + 4;
coupon_pitch_y = tab_w + 6;

module coupon_specimen_2d(tt)
    union() {
        square([L, tt], center = true);
        root_fillets_at_2d(L / 2, tt, 0);         // straight specimens
        for (s = [1, -1])
            translate([s * (L / 2 + tab_len / 2), 0])
                rounded2d(tab_len, tab_w, tab_r);
    }

module coupon_specimen(tt, label, pos) {
    translate(pos) {
        linear_extrude(w) coupon_specimen_2d(tt);
        // embossed label on the +x grip, raised so it survives handling.
        // Label size caps at what the pad fits: a glyph runs ~0.9*size wide
        // (measured off the export — "PETG" at size 3 spanned 10.6 mm), so a
        // fixed size 3 hung 0.3 mm of the 4-glyph "PETG" past each pad edge
        // into mid-air. 1 mm total margin.
        translate([L / 2 + tab_len / 2, 0, w])
            linear_extrude(0.6)
                text(label, size = min(3, (tab_len - 1) / (0.9 * len(label))),
                     halign = "center", valign = "center");
    }
}

// ladder labels keep one decimal: str(1.0) is "1", which reads as a typo
// next to 0.6 and 0.8
function fmt_t(tt) = str(tt, tt == floor(tt) ? ".0" : "");

module coupon_strip() {
    n = len(coupon_ts);
    for (i = [0 : n - 1])
        coupon_specimen(coupon_ts[i], fmt_t(coupon_ts[i]),
                        [(i % 3) * coupon_pitch_x,
                         floor(i / 3) * coupon_pitch_y, 0]);
    // the PLA / PETG pair: identical production-t geometry, different filament
    coupon_specimen(t, "PETG",
                    [(n % 3) * coupon_pitch_x, floor(n / 3) * coupon_pitch_y, 0]);
    coupon_specimen(t, "PLA",
                    [((n + 1) % 3) * coupon_pitch_x,
                     floor((n + 1) / 3) * coupon_pitch_y, 0]);
}

// ---- dispatch ----------------------------------------------------------
// "" = the pivot. "coupon" = the print-this-first strip. "fitcheck" = the
// check that catches a fused-solid bug (ci.fitchecks): the rigid bodies'
// overlap at rest (must be EMPTY — they meet only through the flexures) plus
// pocket probes through the part (must be EMPTY — the four pockets flanking
// the crossing stay open). "fitcheck_neg" = the stage driven 5 deg PAST the
// hard stop (must INTERFERE — the stops bite, and the check can fail).
// "fitcheck_stop_lo"/"_hi" = the ROM bound itself: 0.5 deg inside the stop
// must clear and 0.5 deg past it must interfere, so the exported ROM is
// measured at stop_angle ± 0.5 deg, not asserted.
part = "";

module main() {
    checks();

    if (part == "coupon")
        coupon_strip();
    else if (part == "fitcheck")
        linear_extrude(w)
            union() {
                intersection() { frame_2d(); stage_2d(); }
                intersection() {
                    pivot_2d();
                    for (p = probe_pts) translate(p) circle(probe_r);
                }
            }
    else if (part == "fitcheck_neg")
        linear_extrude(w)
            intersection() { frame_2d(); rotate([0, 0, stop_angle + 5]) stage_2d(); }
    else if (part == "fitcheck_stop_lo")
        // ROM measured bound, − side: half a degree INSIDE the stop must
        // still clear — the arcs have not touched yet
        linear_extrude(w)
            intersection() { frame_2d(); rotate([0, 0, -(stop_angle - 0.5)]) stage_2d(); }
    else if (part == "fitcheck_stop_hi")
        // ROM measured bound, + side: half a degree PAST it must interfere —
        // so the export's ROM is stop_angle +/- 0.5 deg, not "about 40"
        linear_extrude(w)
            intersection() { frame_2d(); rotate([0, 0, stop_angle + 0.5]) stage_2d(); }
    else if (part == "") {
        linear_extrude(w) pivot_2d();
        if (h_pad > 0) translate([0, 0, w]) linear_extrude(h_pad) stage_tab_2d();
    } else
        assert(false, str("unknown part: ", part));
}

main();
